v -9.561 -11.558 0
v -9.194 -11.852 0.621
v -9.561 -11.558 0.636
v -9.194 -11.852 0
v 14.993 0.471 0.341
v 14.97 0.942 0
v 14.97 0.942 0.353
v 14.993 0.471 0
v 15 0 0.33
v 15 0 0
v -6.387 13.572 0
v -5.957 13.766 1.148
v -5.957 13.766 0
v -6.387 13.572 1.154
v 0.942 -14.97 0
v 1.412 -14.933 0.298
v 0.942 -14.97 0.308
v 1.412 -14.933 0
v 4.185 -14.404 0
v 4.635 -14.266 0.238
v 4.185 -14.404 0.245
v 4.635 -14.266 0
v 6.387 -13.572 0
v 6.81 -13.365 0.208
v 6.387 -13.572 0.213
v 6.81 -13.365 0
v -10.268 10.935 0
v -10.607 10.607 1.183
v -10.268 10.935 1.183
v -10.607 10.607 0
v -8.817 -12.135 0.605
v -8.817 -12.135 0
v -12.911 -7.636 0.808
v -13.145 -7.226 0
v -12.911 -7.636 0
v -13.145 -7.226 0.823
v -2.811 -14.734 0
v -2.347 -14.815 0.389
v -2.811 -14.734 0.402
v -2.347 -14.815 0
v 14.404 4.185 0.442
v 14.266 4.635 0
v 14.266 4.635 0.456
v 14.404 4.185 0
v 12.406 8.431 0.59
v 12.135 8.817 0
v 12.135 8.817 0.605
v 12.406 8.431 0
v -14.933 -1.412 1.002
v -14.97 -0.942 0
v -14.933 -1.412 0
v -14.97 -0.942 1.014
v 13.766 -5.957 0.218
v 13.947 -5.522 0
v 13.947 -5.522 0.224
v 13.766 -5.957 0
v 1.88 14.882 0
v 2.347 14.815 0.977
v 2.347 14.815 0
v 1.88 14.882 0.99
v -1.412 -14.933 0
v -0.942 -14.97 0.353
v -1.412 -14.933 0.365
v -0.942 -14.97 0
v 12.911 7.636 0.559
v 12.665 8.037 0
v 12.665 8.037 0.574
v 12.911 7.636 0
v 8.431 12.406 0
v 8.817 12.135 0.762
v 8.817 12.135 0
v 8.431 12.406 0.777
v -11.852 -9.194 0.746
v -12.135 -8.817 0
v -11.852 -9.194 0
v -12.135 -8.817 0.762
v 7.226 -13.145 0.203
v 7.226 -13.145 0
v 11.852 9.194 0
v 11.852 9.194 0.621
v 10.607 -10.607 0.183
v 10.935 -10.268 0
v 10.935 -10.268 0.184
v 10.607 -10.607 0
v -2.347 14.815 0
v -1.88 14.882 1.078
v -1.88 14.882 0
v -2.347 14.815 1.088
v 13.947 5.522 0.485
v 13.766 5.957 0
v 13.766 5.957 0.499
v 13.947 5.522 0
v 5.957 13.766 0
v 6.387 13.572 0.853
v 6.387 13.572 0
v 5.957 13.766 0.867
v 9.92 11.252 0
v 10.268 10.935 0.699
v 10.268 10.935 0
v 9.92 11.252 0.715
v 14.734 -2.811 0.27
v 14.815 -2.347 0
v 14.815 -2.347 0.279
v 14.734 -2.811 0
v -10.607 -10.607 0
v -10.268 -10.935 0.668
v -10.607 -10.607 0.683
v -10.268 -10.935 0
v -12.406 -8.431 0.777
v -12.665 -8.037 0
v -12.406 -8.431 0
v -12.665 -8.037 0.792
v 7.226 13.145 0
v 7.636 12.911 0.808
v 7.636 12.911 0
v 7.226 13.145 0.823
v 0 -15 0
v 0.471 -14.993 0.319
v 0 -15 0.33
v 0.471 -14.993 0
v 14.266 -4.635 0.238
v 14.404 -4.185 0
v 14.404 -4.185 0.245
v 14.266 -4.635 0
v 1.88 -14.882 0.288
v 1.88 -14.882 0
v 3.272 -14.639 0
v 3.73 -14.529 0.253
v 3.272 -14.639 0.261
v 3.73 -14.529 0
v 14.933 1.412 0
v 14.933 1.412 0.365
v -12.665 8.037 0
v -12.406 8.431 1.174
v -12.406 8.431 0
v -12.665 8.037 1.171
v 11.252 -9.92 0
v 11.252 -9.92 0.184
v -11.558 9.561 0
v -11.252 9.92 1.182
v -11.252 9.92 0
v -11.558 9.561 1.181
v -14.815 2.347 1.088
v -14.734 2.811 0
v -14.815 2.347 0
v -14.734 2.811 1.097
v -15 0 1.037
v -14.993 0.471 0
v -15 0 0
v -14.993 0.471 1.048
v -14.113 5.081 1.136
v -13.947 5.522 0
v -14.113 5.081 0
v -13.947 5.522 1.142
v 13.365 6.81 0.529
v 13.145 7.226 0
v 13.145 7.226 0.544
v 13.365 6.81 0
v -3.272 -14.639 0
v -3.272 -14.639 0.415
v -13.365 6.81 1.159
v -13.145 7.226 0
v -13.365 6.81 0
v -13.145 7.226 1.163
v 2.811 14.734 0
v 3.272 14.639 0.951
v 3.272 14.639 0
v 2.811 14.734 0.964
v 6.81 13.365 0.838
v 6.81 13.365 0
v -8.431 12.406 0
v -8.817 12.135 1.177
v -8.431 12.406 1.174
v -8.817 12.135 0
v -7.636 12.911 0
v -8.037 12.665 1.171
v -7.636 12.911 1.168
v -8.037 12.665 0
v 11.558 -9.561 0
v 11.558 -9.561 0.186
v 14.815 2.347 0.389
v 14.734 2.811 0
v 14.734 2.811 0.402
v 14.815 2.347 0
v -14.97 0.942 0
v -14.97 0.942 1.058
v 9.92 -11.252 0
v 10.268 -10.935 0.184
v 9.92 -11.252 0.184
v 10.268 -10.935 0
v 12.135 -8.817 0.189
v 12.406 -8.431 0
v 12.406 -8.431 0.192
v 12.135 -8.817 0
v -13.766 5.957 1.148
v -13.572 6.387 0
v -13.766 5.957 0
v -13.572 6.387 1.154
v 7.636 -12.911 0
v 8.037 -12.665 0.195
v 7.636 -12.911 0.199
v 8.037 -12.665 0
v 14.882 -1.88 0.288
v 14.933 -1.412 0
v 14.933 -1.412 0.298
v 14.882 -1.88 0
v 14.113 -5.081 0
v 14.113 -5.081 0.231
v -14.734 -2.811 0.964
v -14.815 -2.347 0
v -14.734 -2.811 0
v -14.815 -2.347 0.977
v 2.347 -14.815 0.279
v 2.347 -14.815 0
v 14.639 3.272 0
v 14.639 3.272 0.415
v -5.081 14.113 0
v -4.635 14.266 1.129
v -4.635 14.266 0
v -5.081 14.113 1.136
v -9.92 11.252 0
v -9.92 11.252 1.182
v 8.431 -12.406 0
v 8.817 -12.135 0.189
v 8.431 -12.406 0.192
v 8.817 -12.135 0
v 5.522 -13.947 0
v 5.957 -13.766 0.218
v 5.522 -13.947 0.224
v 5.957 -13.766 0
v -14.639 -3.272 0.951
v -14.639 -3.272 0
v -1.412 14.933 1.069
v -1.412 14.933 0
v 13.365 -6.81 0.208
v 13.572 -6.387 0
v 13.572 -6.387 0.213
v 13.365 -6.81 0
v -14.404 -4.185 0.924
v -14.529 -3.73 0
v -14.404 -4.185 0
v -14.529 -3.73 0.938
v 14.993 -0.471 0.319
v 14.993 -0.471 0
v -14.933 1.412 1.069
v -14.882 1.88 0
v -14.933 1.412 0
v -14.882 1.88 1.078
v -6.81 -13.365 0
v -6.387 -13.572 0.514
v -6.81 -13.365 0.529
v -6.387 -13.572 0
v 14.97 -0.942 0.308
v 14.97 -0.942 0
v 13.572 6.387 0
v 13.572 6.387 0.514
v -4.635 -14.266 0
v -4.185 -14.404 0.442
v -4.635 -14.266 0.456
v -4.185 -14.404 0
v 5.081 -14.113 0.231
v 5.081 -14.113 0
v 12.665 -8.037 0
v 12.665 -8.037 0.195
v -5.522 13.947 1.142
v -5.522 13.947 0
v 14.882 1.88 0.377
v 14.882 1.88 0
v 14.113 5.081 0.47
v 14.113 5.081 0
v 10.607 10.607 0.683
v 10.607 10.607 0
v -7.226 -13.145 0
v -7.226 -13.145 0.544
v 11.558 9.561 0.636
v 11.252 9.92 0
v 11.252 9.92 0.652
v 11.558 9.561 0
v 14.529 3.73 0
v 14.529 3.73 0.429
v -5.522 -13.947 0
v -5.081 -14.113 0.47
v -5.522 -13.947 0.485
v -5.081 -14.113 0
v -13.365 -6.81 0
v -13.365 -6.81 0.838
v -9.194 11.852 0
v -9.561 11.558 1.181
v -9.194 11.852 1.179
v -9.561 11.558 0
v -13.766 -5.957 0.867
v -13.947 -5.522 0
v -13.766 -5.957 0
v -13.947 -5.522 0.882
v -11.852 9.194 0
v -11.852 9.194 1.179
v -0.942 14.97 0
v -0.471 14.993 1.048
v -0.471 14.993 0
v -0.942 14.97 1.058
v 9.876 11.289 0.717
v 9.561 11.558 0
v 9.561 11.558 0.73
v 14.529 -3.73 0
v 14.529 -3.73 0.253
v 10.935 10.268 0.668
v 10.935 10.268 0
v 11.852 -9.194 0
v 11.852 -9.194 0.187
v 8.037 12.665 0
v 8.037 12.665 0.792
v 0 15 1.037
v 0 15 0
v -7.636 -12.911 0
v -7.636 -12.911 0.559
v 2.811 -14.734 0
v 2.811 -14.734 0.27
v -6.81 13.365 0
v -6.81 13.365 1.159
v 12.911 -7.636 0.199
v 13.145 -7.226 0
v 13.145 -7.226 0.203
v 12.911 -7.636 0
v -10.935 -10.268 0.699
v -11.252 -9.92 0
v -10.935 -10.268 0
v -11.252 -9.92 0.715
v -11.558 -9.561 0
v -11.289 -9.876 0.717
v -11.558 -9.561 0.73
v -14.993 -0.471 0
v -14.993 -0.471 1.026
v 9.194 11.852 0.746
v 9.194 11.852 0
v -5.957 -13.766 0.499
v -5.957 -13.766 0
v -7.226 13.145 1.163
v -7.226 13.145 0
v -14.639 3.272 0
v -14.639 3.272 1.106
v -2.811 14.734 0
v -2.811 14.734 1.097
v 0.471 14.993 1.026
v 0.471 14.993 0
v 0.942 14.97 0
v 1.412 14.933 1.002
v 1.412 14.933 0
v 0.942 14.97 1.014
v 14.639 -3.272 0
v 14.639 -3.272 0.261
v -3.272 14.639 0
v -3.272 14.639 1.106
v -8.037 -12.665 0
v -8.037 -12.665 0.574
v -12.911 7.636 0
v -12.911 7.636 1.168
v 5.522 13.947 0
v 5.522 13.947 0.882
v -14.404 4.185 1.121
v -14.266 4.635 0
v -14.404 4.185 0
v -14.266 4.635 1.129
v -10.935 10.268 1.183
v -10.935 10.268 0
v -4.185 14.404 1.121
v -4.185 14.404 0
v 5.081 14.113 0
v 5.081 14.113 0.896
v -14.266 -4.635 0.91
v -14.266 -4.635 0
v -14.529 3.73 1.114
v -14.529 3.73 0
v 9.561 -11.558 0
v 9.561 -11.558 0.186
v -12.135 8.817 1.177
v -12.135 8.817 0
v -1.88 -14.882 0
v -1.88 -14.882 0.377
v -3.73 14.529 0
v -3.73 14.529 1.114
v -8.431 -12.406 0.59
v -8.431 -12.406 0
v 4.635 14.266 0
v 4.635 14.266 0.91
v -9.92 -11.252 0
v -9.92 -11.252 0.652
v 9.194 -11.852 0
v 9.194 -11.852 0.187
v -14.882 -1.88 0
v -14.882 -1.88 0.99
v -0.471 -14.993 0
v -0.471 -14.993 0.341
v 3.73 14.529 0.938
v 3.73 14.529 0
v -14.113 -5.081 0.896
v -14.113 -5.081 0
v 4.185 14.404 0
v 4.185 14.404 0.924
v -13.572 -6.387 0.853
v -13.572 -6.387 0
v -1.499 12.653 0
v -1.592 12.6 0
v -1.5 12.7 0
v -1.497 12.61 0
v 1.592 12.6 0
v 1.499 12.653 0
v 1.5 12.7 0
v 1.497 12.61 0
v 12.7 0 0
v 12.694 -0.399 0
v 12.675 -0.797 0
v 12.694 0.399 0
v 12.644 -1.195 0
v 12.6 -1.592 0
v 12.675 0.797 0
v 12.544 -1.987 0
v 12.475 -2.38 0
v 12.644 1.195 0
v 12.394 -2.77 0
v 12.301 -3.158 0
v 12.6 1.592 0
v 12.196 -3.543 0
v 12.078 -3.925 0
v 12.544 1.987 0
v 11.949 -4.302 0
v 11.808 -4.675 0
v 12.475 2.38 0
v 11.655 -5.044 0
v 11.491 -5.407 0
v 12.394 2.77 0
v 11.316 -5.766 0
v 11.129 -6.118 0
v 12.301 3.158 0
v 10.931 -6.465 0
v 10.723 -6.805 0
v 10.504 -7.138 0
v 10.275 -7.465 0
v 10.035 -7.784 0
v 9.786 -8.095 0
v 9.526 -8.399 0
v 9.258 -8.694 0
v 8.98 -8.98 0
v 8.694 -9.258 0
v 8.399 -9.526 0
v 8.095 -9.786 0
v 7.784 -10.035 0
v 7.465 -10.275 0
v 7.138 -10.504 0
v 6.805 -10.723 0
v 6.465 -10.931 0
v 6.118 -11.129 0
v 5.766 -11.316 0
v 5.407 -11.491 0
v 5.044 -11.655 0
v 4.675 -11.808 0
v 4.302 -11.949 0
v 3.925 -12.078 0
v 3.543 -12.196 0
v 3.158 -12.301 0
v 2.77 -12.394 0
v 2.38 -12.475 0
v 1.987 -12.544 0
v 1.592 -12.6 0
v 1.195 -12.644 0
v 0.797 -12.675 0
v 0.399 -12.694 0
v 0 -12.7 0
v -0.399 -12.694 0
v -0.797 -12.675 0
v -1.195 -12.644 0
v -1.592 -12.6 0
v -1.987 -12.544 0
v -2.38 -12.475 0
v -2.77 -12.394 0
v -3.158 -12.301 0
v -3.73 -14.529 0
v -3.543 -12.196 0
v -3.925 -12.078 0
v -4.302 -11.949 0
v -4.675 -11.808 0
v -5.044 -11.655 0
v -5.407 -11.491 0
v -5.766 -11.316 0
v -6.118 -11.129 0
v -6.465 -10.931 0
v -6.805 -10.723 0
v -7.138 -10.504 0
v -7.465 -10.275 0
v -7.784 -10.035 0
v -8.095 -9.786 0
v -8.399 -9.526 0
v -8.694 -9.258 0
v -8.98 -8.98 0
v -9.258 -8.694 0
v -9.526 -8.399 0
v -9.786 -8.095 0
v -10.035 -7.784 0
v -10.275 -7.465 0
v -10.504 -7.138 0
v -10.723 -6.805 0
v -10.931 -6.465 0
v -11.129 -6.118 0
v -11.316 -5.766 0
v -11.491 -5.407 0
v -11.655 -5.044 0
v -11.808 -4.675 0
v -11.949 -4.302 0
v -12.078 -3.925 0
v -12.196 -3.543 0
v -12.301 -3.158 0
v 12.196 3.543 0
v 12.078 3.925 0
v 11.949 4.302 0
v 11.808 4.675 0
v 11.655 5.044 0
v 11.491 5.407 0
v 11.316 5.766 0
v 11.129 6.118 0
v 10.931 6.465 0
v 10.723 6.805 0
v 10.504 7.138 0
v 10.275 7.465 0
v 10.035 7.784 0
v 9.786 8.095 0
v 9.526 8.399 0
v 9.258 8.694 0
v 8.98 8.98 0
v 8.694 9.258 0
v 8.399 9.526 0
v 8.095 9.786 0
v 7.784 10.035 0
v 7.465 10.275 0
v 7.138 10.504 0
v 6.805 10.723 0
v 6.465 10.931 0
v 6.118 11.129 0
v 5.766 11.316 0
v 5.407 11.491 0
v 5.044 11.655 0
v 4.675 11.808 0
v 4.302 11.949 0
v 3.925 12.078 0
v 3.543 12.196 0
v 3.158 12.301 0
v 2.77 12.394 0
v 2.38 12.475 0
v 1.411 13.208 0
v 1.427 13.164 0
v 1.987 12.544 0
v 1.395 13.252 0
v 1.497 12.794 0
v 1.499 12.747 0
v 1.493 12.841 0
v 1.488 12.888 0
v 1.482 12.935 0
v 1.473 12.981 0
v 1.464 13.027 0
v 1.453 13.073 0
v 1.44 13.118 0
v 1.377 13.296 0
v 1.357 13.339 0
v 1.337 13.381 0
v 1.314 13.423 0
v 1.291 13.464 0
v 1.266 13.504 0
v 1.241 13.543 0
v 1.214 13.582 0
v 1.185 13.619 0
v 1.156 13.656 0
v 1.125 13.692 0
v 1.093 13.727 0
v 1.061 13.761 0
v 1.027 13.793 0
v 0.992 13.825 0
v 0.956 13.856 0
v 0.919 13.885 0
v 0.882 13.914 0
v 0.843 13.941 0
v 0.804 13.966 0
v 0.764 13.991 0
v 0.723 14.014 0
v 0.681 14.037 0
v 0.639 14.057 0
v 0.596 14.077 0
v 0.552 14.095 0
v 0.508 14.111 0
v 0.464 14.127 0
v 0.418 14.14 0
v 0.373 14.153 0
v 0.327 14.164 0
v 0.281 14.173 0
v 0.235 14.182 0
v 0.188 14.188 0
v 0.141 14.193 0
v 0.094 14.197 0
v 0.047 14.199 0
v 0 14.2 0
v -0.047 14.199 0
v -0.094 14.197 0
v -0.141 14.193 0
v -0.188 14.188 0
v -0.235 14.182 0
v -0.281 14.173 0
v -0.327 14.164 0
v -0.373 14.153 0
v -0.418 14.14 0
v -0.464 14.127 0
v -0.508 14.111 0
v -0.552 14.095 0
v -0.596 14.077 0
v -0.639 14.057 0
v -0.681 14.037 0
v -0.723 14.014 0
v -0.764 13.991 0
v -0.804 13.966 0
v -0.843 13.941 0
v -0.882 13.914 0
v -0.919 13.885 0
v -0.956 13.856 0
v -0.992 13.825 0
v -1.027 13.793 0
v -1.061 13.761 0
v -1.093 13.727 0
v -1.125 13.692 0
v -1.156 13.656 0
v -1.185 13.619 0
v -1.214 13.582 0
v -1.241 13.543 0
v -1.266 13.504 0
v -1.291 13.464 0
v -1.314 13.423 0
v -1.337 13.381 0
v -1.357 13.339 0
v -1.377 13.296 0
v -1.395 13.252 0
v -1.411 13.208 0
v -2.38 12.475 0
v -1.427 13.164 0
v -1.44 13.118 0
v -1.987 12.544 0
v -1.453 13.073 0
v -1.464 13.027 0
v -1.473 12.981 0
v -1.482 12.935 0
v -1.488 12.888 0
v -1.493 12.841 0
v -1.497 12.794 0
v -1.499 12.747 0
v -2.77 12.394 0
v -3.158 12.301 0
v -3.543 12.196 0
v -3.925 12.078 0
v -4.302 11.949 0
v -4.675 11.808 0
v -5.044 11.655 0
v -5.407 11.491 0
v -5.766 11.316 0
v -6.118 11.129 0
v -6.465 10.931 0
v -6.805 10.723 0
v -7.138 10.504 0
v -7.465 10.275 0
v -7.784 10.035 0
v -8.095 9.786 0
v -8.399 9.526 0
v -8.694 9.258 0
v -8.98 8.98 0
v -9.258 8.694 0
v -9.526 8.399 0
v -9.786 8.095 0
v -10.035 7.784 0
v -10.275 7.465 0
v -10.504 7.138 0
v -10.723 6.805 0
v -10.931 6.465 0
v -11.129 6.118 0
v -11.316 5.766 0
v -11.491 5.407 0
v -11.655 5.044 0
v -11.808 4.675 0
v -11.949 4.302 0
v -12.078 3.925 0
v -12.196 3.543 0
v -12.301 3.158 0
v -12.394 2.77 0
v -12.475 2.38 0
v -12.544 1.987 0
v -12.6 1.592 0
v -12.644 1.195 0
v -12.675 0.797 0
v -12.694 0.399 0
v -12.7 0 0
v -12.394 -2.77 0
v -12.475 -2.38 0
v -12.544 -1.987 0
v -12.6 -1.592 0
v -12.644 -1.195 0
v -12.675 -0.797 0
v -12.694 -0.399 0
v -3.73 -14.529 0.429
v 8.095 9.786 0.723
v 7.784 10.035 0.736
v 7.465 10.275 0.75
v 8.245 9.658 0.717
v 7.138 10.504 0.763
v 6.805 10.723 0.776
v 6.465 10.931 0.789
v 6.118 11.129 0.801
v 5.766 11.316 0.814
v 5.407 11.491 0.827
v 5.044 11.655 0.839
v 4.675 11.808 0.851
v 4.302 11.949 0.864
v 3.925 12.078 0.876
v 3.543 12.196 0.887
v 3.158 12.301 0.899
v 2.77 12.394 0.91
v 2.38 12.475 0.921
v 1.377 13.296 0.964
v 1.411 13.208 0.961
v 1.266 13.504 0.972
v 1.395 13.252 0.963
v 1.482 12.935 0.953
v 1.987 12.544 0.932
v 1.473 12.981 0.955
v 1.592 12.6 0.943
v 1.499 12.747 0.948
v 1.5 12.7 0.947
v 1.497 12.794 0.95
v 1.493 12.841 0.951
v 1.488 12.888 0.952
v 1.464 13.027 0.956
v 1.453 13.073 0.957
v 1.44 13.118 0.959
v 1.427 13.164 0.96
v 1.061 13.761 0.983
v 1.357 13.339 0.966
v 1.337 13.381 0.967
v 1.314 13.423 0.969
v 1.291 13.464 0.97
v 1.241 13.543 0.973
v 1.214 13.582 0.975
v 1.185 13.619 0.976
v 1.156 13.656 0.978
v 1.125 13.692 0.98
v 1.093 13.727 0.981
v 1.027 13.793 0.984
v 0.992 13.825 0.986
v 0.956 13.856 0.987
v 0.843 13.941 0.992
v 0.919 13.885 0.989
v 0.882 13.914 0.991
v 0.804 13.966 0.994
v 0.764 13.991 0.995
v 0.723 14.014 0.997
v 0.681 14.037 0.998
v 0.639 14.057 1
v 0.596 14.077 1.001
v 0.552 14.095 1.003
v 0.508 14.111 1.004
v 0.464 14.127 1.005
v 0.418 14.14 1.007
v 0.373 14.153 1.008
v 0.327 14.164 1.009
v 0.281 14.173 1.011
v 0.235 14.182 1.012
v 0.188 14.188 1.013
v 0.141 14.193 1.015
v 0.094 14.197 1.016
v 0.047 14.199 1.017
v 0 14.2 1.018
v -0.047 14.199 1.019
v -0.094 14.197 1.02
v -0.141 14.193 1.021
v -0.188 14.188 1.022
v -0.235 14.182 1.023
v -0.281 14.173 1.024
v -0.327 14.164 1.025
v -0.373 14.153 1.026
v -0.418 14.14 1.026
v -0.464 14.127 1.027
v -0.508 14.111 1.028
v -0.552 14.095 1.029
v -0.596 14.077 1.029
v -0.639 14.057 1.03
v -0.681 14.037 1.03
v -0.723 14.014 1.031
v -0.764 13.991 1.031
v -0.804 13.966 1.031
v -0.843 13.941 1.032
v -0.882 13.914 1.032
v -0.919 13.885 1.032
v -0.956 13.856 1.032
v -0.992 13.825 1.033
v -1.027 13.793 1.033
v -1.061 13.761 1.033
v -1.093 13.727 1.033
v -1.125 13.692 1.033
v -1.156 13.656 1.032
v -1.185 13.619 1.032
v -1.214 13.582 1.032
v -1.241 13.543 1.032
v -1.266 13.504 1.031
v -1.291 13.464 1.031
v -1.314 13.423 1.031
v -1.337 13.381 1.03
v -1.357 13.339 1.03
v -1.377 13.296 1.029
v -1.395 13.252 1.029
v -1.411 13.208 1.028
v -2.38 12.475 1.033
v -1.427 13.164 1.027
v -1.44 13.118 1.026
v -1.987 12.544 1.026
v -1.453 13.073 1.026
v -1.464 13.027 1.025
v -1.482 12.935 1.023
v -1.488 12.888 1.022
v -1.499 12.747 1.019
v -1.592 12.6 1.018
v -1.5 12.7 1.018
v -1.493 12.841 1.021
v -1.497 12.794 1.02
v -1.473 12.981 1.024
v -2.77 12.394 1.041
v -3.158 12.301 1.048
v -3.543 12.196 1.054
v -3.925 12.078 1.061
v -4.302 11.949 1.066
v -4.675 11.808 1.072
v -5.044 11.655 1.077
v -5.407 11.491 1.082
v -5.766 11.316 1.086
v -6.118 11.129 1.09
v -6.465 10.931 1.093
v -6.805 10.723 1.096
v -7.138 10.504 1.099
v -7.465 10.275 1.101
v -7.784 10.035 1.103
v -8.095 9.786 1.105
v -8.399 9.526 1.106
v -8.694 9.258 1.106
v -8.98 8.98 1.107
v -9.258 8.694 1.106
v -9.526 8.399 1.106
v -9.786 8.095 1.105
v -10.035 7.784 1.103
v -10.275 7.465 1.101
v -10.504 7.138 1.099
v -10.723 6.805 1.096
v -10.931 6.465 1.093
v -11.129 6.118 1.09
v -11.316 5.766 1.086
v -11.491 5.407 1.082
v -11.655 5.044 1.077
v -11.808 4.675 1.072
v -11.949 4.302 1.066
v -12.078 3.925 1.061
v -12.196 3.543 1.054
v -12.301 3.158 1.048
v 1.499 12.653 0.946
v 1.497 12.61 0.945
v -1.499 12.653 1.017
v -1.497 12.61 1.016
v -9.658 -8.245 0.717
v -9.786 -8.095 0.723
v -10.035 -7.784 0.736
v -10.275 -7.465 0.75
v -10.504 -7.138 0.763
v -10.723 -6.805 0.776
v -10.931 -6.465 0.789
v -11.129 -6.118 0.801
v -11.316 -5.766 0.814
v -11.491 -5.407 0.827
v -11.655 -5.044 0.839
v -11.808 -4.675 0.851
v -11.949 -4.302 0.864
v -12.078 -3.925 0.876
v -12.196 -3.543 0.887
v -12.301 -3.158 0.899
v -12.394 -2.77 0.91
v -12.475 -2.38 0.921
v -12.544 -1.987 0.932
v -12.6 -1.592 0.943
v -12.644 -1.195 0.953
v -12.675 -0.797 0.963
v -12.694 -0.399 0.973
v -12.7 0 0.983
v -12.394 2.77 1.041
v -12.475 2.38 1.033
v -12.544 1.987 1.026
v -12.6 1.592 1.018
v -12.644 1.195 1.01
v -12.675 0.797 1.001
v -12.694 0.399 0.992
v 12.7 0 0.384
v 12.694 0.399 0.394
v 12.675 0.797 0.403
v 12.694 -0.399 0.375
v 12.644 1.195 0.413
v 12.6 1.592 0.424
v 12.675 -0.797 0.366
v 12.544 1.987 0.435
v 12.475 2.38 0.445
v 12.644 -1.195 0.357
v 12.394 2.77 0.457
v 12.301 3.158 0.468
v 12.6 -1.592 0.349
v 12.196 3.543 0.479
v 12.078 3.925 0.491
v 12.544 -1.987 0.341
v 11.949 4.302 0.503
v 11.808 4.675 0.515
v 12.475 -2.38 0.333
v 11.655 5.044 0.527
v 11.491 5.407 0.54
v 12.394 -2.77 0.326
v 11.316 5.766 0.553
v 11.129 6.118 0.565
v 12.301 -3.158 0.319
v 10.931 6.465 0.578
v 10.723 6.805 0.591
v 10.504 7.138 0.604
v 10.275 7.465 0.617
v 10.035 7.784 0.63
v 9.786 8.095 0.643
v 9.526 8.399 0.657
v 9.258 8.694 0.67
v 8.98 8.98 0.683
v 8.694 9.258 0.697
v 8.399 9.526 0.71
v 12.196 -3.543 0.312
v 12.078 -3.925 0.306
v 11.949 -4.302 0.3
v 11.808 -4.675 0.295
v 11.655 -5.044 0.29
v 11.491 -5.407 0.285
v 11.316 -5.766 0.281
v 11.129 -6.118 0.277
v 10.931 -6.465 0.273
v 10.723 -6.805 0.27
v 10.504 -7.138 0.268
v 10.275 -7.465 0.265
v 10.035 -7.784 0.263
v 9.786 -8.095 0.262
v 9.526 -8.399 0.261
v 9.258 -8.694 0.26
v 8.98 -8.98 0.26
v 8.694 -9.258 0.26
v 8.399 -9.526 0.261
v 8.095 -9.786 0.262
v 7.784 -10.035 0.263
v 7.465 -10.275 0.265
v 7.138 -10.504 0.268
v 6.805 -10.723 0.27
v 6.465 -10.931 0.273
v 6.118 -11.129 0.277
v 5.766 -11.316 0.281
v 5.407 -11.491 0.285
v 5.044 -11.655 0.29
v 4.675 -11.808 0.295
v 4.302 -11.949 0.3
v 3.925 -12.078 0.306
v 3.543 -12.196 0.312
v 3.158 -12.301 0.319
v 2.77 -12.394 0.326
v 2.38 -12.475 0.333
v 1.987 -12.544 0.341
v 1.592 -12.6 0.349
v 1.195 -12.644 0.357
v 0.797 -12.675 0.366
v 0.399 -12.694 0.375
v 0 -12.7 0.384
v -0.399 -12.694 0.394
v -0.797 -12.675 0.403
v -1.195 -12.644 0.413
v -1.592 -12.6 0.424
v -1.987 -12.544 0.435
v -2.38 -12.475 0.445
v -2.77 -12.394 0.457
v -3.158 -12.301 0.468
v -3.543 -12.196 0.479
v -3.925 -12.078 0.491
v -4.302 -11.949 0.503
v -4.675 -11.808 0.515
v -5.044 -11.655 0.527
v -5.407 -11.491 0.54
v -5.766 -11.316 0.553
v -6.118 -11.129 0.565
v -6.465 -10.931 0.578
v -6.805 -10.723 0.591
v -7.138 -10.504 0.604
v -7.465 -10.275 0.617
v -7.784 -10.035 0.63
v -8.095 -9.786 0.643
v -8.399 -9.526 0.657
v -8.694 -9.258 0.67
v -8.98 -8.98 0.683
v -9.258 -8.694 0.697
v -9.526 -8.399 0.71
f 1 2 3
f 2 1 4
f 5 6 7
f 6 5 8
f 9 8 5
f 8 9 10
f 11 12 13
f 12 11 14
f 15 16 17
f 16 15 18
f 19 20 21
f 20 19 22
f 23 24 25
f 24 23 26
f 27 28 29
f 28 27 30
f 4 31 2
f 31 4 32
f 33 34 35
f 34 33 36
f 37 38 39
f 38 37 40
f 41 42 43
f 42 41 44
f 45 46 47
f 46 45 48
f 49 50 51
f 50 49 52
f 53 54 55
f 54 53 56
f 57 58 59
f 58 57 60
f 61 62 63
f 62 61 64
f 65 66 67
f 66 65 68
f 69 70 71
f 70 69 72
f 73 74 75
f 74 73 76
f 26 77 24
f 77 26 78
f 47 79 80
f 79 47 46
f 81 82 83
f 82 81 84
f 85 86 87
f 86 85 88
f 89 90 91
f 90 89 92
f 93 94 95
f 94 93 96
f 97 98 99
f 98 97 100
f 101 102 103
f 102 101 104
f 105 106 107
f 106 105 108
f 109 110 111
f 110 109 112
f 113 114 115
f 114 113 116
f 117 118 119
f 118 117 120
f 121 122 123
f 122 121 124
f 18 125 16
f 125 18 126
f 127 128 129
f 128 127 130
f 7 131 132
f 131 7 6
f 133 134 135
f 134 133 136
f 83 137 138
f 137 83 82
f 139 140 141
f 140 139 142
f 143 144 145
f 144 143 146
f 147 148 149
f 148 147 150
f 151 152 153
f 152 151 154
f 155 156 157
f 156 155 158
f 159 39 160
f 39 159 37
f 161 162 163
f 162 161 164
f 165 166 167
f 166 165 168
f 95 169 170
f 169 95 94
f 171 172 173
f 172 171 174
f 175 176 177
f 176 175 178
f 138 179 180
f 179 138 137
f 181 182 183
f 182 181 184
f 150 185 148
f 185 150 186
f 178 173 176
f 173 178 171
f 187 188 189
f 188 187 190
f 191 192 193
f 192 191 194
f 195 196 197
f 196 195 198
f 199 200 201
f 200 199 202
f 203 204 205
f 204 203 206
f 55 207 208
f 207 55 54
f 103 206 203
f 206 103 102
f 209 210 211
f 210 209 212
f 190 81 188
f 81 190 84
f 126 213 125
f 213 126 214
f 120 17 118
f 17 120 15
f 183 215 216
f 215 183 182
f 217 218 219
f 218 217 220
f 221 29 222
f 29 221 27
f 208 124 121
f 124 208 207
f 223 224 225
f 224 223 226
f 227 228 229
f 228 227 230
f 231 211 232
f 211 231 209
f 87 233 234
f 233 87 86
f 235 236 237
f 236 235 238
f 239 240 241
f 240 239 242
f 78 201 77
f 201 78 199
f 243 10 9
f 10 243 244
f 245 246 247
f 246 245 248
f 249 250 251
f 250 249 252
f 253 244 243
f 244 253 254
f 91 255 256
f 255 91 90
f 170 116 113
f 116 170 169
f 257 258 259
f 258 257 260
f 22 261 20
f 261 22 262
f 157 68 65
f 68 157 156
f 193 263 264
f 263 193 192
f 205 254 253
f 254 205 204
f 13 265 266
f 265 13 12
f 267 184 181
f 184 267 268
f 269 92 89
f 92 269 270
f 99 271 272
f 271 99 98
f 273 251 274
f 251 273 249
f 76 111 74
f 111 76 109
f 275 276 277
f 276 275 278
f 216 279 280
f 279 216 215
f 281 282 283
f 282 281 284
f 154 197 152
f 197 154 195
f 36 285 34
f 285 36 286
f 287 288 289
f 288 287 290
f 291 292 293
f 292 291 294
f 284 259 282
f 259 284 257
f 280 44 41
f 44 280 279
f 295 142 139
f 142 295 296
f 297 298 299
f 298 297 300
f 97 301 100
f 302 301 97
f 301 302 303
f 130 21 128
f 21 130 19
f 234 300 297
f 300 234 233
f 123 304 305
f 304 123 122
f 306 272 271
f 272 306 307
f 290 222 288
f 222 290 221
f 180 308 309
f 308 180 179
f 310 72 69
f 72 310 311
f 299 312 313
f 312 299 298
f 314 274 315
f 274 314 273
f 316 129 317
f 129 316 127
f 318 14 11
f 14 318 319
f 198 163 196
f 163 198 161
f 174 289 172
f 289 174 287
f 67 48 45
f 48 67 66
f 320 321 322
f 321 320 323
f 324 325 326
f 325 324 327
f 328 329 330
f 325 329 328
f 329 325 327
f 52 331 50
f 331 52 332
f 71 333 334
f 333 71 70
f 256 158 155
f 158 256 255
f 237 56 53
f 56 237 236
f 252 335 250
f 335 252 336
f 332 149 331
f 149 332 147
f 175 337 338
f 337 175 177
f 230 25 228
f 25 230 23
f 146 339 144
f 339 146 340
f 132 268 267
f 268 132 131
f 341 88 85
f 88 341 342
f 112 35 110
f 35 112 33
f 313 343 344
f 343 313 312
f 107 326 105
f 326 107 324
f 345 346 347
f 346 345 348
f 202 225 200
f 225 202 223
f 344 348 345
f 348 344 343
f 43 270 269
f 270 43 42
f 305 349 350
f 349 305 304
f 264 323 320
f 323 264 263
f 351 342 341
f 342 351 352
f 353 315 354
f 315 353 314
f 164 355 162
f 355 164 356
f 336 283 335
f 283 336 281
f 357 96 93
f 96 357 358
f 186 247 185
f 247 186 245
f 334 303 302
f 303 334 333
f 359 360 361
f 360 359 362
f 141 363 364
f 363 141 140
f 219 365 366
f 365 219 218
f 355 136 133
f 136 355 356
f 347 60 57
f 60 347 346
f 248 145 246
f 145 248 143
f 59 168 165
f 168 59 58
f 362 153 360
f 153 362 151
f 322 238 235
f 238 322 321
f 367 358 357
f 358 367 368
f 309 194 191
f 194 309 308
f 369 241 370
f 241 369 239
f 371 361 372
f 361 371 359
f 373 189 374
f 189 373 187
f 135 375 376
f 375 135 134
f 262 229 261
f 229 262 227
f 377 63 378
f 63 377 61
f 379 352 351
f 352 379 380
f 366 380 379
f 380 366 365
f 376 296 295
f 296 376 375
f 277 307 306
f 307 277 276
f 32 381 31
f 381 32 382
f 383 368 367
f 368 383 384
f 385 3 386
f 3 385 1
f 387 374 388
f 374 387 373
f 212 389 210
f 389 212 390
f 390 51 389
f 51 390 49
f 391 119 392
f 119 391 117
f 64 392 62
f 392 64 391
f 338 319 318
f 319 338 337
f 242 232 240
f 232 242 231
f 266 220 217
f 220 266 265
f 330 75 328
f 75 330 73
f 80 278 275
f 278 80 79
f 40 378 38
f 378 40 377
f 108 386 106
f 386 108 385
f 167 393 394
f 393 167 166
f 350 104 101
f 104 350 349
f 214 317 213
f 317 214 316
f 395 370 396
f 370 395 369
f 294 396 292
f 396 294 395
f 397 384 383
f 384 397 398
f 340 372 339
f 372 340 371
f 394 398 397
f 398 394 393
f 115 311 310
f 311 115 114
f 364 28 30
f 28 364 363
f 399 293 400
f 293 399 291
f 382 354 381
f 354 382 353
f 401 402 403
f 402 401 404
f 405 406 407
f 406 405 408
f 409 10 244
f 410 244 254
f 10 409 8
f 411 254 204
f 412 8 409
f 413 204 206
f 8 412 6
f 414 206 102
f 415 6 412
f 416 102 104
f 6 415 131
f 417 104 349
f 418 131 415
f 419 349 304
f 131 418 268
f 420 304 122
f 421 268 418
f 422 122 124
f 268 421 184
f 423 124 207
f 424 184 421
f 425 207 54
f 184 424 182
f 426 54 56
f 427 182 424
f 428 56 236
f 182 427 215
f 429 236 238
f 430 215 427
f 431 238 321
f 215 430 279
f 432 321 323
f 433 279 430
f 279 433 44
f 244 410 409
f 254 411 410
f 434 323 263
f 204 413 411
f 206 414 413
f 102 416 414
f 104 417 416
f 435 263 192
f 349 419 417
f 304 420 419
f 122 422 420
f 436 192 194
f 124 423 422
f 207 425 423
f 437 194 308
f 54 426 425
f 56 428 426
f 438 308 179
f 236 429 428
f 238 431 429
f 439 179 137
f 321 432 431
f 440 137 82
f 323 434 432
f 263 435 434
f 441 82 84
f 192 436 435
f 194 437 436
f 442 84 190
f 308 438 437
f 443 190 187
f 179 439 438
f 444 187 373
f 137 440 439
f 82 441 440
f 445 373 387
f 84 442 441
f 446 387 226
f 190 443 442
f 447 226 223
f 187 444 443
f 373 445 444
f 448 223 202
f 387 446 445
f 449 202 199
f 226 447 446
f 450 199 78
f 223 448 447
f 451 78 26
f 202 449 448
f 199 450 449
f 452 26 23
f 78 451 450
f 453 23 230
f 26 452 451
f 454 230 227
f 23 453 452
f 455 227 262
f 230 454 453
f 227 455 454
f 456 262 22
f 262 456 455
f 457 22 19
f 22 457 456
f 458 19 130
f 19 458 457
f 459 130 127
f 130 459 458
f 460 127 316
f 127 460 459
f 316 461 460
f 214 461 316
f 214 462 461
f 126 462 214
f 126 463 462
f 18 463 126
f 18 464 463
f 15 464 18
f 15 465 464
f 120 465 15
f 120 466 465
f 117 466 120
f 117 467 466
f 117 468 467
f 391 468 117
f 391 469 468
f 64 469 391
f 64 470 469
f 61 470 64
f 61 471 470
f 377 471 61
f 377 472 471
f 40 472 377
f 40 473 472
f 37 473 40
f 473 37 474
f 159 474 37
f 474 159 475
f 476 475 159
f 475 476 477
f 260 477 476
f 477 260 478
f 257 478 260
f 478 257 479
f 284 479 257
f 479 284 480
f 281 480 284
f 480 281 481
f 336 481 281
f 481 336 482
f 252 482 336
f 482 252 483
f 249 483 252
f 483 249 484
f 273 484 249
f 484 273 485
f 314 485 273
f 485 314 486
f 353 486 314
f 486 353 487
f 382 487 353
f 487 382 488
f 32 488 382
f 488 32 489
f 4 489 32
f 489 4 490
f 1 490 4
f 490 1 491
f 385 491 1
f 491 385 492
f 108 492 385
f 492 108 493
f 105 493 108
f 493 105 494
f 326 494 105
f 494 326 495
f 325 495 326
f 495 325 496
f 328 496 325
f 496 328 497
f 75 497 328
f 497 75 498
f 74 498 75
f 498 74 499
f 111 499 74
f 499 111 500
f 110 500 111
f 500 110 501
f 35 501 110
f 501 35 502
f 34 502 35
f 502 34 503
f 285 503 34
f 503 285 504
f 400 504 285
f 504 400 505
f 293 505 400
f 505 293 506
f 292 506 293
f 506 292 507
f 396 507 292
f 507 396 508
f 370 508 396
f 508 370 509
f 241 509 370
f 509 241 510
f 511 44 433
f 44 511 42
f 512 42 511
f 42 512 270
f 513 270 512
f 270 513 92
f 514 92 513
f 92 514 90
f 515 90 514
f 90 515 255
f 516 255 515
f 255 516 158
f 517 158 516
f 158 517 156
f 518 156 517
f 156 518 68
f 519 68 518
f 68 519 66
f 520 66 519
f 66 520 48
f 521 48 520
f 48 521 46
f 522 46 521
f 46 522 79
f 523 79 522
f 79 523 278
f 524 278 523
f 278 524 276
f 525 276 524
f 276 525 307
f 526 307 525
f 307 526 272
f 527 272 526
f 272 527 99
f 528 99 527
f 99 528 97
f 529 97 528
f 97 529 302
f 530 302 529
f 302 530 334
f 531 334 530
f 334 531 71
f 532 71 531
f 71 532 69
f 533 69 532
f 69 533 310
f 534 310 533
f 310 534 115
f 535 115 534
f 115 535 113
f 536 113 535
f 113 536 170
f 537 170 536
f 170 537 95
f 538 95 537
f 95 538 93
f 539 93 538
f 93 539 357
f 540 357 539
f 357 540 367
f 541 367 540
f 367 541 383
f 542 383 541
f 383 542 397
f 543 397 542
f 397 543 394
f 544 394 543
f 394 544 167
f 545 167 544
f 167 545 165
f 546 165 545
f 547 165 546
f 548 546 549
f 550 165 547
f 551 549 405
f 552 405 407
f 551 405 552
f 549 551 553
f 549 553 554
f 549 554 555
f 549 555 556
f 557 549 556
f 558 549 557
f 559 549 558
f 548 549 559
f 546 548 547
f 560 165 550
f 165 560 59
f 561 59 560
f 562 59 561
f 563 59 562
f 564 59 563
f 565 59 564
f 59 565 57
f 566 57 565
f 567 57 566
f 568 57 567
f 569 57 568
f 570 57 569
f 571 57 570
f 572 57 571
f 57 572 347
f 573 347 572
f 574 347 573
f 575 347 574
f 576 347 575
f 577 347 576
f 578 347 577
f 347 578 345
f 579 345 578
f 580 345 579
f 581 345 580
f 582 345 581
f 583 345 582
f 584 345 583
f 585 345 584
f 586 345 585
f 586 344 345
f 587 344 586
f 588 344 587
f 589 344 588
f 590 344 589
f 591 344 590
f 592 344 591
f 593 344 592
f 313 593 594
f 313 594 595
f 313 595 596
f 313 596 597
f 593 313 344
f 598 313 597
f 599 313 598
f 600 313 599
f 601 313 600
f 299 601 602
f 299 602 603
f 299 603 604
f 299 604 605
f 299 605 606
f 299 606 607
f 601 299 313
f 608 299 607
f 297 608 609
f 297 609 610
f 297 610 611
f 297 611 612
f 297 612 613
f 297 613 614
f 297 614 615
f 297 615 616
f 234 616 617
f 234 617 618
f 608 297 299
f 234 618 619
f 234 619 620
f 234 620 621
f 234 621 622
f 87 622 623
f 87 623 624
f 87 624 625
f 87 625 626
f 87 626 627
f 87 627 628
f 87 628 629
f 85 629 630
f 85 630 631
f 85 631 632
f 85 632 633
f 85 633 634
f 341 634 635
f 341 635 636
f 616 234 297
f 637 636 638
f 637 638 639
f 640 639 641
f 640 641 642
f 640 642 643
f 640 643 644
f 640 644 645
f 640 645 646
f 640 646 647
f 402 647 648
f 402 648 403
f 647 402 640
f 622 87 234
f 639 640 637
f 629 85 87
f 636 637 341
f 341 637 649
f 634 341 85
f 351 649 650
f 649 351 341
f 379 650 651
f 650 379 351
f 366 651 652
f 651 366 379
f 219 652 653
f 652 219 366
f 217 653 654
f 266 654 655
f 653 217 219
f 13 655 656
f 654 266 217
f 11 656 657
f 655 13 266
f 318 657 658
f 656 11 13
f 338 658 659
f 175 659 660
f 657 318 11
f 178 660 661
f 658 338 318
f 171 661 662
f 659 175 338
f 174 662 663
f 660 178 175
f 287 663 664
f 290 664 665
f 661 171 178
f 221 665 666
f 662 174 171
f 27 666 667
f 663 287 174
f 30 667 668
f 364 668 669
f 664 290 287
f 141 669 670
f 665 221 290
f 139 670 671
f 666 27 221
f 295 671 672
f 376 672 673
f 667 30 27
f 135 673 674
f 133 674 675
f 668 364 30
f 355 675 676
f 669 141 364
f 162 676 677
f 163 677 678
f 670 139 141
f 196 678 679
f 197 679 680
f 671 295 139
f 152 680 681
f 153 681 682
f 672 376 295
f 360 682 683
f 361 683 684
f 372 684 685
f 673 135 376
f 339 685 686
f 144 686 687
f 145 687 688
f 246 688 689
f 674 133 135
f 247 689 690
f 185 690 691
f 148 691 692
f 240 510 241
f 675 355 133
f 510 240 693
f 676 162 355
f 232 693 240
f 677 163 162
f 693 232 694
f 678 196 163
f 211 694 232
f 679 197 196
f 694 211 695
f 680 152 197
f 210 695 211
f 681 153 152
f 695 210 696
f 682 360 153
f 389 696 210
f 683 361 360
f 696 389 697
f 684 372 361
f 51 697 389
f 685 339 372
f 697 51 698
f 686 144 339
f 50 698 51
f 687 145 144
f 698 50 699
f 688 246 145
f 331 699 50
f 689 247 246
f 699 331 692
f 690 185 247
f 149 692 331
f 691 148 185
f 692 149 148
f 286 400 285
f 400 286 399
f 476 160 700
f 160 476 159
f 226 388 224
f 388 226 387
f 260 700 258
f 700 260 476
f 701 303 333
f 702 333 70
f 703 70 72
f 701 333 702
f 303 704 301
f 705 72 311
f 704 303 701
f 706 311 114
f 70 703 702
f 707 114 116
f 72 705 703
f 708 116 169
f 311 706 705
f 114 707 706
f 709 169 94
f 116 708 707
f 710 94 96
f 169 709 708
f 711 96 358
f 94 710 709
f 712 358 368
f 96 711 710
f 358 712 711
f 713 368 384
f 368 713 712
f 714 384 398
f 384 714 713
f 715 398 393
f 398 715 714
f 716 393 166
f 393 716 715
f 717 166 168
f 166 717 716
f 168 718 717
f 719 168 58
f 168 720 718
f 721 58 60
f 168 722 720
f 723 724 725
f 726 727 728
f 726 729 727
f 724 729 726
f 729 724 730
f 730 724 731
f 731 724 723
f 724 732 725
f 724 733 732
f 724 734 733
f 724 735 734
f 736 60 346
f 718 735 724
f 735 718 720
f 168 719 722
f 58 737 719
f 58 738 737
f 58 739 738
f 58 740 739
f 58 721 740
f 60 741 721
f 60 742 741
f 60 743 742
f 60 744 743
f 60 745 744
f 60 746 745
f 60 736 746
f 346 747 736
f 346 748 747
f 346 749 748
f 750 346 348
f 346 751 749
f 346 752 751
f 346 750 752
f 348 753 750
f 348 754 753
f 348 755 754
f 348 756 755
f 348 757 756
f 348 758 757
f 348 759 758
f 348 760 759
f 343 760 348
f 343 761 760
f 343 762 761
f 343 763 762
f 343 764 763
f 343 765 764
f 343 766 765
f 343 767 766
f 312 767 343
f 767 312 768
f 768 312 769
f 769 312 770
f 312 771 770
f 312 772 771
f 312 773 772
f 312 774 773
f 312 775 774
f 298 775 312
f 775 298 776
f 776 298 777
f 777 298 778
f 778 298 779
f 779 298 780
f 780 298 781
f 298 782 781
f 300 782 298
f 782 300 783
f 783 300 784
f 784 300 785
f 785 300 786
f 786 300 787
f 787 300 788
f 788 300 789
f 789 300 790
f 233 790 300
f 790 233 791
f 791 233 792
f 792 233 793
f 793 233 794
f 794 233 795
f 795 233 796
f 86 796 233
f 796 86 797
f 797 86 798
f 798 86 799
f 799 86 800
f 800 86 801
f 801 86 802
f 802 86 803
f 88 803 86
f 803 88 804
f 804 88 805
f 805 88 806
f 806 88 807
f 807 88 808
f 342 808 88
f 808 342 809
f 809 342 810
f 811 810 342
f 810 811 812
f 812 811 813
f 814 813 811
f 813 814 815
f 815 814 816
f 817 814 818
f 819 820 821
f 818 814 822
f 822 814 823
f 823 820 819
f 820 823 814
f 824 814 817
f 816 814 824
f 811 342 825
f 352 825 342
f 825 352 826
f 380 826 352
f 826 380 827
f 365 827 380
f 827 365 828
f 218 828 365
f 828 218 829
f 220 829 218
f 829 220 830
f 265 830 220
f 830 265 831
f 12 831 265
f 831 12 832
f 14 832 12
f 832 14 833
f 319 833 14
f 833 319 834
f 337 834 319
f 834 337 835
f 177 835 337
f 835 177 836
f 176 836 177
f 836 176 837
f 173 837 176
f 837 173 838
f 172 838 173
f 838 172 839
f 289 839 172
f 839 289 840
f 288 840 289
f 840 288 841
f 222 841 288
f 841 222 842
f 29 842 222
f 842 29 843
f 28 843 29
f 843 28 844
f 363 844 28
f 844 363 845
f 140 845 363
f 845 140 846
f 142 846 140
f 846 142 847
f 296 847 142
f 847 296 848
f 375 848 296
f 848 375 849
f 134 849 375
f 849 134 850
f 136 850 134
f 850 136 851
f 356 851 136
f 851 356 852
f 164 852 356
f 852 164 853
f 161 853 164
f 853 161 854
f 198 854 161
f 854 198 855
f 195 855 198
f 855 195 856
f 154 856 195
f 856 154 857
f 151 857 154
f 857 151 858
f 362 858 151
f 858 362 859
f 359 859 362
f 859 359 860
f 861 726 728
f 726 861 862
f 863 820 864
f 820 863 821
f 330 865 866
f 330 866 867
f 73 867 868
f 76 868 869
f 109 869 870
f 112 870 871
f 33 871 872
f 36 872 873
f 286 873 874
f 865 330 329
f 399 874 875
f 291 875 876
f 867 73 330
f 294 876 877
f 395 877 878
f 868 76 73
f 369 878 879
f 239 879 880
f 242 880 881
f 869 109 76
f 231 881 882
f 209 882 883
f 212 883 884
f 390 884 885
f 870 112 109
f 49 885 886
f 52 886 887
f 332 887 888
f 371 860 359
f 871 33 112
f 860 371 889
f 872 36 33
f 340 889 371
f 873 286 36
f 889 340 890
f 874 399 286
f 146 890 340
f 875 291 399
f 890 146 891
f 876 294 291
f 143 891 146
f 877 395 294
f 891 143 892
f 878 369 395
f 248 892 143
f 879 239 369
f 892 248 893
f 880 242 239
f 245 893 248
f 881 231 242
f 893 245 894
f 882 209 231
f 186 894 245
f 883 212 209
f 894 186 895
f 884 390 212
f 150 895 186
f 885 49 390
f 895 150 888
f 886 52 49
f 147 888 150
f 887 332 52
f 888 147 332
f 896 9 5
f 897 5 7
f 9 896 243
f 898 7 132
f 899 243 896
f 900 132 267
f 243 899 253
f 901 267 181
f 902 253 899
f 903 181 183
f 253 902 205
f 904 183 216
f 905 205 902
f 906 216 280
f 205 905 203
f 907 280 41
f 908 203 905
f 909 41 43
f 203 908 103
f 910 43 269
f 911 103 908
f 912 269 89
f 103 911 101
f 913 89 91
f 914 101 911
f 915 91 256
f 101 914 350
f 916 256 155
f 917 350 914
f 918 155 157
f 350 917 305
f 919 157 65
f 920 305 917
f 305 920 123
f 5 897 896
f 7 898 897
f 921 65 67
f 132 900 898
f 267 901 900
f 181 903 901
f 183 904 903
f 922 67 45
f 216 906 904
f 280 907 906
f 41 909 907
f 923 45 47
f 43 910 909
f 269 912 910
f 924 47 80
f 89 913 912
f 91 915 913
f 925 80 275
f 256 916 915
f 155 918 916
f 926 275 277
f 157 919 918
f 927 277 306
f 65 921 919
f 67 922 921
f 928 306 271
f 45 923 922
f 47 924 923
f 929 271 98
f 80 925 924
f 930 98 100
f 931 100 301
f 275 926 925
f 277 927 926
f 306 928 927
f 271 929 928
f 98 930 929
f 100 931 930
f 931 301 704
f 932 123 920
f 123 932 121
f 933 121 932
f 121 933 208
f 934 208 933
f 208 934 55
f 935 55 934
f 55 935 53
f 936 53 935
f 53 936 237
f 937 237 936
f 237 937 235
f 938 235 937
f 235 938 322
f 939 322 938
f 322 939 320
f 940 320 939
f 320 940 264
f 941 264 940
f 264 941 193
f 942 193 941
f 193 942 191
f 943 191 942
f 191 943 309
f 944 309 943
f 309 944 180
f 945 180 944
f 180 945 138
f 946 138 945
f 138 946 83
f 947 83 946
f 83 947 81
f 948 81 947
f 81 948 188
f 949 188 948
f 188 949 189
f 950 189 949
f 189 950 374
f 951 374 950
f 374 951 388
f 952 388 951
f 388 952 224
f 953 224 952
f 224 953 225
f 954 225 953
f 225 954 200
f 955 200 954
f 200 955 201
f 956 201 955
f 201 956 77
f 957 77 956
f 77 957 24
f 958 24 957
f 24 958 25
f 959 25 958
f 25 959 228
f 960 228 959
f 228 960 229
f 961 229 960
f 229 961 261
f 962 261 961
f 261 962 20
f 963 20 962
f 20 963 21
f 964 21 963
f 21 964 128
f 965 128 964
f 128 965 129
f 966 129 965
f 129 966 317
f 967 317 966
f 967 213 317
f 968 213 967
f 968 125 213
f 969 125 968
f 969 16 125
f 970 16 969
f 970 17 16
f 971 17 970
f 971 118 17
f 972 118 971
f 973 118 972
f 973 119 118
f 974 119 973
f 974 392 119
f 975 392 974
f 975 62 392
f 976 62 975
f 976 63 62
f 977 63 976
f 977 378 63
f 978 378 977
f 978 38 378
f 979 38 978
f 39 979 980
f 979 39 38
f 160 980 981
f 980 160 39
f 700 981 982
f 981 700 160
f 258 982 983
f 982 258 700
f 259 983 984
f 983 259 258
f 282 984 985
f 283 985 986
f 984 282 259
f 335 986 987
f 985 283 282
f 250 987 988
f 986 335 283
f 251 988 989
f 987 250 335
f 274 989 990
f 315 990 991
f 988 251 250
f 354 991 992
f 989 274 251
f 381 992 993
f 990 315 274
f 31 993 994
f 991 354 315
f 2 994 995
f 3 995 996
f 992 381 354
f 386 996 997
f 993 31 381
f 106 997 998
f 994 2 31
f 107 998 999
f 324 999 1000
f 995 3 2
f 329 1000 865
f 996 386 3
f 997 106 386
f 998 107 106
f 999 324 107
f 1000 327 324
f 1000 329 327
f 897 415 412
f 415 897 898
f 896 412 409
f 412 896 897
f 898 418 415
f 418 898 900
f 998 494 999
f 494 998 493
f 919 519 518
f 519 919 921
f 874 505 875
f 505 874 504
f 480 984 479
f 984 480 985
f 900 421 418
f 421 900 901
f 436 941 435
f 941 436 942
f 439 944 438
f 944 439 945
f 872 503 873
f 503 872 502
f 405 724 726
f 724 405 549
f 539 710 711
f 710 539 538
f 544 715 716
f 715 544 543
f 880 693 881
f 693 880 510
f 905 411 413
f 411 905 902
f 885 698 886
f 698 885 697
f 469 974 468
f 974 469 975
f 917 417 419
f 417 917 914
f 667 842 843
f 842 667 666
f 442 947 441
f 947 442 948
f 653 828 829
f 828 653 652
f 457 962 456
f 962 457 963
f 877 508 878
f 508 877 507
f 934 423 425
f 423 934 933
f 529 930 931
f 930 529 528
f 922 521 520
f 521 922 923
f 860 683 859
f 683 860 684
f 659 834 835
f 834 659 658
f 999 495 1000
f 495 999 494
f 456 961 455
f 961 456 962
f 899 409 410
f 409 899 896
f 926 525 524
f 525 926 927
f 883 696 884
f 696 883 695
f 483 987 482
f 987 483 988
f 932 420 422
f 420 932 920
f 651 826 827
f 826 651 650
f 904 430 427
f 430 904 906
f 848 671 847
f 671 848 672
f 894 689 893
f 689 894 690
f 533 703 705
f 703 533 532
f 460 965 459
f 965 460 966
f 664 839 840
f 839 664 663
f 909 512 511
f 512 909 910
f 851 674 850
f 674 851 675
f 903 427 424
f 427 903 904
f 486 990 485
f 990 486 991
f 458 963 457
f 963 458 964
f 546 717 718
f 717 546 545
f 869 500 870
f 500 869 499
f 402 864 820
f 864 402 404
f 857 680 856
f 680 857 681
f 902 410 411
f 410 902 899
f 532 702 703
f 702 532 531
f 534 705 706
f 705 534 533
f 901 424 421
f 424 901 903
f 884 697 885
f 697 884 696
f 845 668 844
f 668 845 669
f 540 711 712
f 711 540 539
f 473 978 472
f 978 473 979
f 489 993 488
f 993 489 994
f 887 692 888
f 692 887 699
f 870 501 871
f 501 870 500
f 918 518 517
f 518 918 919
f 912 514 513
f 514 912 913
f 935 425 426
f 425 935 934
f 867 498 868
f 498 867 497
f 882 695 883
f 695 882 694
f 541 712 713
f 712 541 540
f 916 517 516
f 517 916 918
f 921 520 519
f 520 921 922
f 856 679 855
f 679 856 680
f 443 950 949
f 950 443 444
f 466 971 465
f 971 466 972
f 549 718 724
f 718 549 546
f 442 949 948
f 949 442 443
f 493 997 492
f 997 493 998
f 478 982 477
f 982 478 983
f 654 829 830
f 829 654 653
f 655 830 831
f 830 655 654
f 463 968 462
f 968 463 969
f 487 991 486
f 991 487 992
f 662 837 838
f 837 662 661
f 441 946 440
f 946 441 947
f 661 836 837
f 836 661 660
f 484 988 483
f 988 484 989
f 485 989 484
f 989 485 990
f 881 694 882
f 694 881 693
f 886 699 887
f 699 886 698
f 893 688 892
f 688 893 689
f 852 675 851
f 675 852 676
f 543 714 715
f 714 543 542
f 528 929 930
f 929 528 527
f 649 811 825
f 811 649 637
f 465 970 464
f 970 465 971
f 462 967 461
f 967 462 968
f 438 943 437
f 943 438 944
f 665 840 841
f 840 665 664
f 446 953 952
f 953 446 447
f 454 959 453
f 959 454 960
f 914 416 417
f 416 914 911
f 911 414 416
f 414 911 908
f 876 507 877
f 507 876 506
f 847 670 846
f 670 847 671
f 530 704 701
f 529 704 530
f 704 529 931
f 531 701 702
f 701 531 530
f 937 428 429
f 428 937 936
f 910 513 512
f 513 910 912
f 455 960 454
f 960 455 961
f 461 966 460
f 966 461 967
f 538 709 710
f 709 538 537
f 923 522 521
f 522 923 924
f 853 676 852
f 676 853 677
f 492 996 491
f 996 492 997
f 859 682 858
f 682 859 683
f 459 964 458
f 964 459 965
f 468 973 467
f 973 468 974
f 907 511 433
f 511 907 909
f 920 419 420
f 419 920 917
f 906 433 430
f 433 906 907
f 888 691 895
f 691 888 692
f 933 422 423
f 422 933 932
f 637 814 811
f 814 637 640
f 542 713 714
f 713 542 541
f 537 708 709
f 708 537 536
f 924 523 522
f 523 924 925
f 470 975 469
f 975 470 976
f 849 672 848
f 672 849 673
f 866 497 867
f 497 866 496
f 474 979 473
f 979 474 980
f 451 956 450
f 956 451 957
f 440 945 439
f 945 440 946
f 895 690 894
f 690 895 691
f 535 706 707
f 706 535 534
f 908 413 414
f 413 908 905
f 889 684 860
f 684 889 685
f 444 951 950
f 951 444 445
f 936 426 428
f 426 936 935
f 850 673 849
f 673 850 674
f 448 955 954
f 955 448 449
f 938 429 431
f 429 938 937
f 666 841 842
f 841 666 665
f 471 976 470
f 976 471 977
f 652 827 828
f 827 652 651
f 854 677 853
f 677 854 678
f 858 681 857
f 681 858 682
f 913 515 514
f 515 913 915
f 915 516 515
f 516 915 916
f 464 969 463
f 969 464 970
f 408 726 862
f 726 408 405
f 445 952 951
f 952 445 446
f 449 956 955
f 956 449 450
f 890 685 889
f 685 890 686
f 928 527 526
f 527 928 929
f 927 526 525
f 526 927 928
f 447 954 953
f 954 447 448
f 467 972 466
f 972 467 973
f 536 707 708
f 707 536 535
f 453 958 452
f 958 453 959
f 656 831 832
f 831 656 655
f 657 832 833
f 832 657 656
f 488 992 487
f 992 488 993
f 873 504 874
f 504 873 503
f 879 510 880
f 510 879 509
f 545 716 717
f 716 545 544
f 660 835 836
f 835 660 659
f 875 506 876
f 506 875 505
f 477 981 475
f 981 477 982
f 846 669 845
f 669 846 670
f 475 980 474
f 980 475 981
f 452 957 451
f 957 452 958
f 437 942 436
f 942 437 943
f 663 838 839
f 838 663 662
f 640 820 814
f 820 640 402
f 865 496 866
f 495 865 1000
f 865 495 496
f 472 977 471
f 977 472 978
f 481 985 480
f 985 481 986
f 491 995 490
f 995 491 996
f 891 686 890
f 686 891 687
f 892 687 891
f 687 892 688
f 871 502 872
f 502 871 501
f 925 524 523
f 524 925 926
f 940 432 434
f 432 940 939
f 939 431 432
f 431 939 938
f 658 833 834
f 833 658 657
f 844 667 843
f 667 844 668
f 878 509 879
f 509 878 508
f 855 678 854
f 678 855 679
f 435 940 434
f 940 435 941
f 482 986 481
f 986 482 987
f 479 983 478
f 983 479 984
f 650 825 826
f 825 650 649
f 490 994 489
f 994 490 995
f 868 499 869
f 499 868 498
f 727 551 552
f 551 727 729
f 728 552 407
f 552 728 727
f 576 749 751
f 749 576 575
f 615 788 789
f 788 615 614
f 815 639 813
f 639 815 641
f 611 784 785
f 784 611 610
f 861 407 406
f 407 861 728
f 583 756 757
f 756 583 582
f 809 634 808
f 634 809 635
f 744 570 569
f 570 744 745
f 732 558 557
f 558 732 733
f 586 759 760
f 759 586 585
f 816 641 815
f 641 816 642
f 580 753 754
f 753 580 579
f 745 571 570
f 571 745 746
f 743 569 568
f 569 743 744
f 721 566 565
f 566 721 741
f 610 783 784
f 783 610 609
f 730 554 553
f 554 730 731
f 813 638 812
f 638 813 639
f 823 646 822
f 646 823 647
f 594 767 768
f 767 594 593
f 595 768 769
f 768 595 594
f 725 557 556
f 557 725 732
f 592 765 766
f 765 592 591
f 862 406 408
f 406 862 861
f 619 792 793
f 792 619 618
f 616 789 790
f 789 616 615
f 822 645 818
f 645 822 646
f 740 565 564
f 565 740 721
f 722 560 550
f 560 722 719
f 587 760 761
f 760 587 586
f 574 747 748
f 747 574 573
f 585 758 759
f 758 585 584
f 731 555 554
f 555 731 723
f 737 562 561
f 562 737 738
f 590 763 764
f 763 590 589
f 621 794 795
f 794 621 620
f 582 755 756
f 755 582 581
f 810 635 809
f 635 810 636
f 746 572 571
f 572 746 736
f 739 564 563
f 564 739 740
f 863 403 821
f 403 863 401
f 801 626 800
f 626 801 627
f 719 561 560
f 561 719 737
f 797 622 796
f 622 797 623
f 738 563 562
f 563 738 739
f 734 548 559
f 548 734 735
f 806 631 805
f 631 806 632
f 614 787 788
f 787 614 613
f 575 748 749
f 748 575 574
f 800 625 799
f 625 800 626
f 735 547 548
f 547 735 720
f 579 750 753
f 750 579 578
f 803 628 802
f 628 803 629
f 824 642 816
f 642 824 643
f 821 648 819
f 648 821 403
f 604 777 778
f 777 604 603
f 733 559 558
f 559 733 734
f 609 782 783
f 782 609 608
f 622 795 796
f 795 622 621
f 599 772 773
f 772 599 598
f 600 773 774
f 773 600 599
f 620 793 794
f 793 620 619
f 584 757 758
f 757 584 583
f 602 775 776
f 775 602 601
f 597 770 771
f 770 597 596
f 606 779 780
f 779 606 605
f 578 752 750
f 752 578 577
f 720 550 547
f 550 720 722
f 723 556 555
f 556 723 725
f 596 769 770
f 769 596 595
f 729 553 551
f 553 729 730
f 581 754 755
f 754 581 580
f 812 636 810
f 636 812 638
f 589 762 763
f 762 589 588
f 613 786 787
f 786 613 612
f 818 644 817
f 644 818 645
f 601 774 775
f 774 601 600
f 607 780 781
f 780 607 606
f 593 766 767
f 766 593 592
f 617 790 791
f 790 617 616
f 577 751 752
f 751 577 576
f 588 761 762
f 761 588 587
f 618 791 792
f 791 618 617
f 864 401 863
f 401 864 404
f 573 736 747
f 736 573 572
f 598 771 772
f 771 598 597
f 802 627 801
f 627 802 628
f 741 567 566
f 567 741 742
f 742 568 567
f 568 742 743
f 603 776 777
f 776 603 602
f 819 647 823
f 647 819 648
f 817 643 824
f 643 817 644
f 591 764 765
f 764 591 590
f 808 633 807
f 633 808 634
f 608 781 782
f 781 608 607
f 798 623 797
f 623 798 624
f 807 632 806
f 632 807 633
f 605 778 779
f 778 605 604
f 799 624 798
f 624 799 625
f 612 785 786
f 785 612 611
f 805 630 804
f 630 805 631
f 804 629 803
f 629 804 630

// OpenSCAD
// file: dimensions.scad
r_outer = 30/2;
r_inner = 25.4/2;
r_registration_cutout = 1.5;
h_cutouts = 20; // Just some large number
h_ring_min = 0.2;
h_ring_max = 1.2;
h_ring_diff = h_ring_max - h_ring_min;

$fn=200;
// main file
include <dimensions.scad>

difference(){
  cylinder(h_ring_max, r_outer, r_outer, [0,0,0]);
  translate([0, 0, h_ring_diff/2 + h_ring_min + 2*r_outer]){
    rotate(a=atan2(h_ring_max- h_ring_min, 2*r_outer), v = [1,1,0]){
      cube(r_outer*4, center=true);
    }
  }
  translate([0,0,-h_cutouts/2]){
    cylinder(h_cutouts, r_inner, r_inner, [0,0,0]);
  }
  translate([0,r_inner,-h_cutouts/2]){
    cylinder(h_cutouts, r_registration_cutout, r_registration_cutout, [0,0,0]);
  }
}
